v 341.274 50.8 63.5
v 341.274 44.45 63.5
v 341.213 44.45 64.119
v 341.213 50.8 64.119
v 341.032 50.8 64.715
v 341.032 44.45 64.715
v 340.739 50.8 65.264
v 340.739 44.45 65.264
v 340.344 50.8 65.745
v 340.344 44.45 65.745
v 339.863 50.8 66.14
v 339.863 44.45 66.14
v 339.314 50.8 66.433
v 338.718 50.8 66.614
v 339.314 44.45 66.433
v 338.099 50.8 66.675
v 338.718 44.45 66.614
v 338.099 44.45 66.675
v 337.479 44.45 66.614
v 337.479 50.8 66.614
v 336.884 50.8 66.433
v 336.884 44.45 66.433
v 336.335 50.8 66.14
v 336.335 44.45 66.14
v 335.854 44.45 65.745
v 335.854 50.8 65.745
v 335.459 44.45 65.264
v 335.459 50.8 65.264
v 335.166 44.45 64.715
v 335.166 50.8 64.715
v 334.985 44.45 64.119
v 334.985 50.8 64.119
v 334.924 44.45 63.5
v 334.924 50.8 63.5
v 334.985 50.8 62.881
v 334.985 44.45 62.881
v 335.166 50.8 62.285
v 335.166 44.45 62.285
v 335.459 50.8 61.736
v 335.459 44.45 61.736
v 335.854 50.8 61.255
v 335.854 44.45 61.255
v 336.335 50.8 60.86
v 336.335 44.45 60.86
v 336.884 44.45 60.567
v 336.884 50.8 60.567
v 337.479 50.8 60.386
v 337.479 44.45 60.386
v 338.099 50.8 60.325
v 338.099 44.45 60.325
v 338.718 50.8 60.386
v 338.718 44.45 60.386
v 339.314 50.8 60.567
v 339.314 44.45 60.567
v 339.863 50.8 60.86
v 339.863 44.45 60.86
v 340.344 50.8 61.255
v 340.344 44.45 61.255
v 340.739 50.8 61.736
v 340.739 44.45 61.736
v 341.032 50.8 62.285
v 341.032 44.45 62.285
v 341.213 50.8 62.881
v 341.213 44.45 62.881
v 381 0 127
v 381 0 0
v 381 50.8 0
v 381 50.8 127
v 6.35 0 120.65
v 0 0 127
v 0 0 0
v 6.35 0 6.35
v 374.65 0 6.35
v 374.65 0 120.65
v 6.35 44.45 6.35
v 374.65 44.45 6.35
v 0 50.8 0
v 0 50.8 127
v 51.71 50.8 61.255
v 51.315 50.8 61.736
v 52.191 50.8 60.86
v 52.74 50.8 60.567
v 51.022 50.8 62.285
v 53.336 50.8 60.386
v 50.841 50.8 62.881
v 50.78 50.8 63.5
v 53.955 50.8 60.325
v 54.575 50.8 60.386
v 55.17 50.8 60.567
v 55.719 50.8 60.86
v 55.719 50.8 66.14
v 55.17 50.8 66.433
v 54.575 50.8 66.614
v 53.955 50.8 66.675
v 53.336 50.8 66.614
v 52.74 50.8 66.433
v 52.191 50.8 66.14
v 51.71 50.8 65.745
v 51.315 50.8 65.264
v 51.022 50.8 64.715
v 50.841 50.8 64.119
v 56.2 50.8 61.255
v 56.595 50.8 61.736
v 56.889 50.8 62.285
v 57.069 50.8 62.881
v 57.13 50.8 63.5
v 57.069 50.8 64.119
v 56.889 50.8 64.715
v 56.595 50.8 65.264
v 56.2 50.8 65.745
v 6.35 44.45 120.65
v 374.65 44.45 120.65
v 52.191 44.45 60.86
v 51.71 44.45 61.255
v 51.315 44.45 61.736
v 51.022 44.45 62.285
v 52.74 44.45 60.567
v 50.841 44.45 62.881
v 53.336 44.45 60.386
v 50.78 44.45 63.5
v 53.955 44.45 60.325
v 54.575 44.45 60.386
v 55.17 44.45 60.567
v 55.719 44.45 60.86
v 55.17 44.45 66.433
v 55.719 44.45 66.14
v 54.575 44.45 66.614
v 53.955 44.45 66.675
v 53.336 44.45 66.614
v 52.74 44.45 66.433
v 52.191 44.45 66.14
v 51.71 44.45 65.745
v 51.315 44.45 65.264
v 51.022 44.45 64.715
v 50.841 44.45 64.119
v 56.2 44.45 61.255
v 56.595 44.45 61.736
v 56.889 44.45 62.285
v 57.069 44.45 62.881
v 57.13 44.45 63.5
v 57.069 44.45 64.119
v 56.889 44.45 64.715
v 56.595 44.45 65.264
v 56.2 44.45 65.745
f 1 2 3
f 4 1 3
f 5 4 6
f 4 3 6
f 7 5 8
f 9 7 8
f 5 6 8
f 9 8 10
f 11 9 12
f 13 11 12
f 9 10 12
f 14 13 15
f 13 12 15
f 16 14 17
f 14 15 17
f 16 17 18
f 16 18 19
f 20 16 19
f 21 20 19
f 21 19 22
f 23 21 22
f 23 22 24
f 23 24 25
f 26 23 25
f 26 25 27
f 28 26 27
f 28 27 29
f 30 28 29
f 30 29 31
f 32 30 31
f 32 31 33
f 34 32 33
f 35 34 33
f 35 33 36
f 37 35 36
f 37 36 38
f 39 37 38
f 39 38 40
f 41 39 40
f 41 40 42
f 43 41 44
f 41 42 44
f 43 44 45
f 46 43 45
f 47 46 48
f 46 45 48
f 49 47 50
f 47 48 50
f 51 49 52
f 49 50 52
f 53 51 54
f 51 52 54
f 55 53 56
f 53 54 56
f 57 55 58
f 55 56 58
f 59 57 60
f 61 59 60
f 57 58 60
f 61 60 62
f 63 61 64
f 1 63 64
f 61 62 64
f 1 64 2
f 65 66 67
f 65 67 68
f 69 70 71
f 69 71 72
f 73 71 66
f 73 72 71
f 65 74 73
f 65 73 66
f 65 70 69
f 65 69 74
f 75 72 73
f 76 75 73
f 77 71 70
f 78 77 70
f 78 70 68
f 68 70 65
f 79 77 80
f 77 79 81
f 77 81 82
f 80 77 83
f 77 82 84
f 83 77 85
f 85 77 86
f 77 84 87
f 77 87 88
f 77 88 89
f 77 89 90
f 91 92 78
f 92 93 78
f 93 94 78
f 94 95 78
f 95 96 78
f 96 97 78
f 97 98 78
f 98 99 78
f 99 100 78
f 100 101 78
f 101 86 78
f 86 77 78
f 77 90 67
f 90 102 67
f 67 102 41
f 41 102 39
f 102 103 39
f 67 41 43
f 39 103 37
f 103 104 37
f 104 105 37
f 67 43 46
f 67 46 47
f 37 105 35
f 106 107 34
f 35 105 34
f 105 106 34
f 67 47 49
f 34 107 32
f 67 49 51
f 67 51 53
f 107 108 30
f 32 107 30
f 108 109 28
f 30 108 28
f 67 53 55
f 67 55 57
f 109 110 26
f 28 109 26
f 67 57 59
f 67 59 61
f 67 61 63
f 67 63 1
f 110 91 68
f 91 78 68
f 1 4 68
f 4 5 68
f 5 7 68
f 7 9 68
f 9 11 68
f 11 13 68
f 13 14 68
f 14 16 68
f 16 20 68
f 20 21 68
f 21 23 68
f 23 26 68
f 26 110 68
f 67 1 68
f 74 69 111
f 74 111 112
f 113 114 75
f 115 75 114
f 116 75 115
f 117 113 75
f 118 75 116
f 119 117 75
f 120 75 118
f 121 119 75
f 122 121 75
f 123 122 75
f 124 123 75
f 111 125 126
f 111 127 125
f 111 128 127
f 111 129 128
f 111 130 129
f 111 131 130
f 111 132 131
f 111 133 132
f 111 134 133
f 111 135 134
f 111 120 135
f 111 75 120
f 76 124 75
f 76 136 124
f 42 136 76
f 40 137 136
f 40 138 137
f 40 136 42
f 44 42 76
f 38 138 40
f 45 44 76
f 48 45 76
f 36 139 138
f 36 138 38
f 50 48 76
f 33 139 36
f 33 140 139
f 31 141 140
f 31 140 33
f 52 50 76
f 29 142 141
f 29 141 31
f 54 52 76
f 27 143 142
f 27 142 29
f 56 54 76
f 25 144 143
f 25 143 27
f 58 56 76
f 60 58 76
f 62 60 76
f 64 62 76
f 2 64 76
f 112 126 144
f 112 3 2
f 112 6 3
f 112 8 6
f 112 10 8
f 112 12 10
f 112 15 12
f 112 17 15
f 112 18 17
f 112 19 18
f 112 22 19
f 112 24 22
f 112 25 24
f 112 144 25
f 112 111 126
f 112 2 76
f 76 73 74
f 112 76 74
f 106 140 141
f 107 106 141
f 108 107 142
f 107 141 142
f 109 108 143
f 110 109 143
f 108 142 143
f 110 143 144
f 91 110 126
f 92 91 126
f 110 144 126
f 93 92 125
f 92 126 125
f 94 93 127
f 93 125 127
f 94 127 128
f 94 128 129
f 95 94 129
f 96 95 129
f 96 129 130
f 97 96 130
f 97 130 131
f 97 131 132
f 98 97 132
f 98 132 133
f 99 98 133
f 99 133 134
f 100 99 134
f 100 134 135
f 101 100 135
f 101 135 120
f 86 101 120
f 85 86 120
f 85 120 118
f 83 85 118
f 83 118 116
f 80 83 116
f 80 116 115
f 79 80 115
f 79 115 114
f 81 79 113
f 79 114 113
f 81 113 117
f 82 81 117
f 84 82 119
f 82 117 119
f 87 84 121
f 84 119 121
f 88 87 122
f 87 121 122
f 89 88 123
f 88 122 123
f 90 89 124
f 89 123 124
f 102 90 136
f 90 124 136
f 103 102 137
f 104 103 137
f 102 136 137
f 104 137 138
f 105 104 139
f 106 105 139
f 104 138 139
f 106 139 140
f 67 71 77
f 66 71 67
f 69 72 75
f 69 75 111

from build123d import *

# Parameters (mm, degrees)
F0_W     = 381
F0_H     = 127
F1_DEPTH = 50.8
F2_W     = 368.3
F2_H     = 114.3
F3_DEPTH = 44.45
F4_R     = 3.175
F5_DEPTH = 6.351


with BuildPart() as f1:
    # F0 (on Front) → F1 (new body)
    with BuildSketch(Plane.XZ):
        with Locations((190.5, 63.5)):
            Rectangle(F0_W, F0_H)
    extrude(amount=-F1_DEPTH)

    # F2 (on face) → F3 (cut)
    with BuildSketch(Plane.XZ):
        with Locations((190.5, 63.5)):
            Rectangle(F2_W, F2_H)
    extrude(amount=-F3_DEPTH, mode=Mode.SUBTRACT)

    # F4 (on face) → F5 (cut, through all)
    with BuildSketch(Plane.XZ.offset(-44.45)):
        with Locations((53.955268, 63.5)):
            Circle(F4_R)
        with Locations((338.098884, 63.5)):
            Circle(F4_R)
    extrude(amount=-F5_DEPTH, mode=Mode.SUBTRACT)


solid = f1.part
